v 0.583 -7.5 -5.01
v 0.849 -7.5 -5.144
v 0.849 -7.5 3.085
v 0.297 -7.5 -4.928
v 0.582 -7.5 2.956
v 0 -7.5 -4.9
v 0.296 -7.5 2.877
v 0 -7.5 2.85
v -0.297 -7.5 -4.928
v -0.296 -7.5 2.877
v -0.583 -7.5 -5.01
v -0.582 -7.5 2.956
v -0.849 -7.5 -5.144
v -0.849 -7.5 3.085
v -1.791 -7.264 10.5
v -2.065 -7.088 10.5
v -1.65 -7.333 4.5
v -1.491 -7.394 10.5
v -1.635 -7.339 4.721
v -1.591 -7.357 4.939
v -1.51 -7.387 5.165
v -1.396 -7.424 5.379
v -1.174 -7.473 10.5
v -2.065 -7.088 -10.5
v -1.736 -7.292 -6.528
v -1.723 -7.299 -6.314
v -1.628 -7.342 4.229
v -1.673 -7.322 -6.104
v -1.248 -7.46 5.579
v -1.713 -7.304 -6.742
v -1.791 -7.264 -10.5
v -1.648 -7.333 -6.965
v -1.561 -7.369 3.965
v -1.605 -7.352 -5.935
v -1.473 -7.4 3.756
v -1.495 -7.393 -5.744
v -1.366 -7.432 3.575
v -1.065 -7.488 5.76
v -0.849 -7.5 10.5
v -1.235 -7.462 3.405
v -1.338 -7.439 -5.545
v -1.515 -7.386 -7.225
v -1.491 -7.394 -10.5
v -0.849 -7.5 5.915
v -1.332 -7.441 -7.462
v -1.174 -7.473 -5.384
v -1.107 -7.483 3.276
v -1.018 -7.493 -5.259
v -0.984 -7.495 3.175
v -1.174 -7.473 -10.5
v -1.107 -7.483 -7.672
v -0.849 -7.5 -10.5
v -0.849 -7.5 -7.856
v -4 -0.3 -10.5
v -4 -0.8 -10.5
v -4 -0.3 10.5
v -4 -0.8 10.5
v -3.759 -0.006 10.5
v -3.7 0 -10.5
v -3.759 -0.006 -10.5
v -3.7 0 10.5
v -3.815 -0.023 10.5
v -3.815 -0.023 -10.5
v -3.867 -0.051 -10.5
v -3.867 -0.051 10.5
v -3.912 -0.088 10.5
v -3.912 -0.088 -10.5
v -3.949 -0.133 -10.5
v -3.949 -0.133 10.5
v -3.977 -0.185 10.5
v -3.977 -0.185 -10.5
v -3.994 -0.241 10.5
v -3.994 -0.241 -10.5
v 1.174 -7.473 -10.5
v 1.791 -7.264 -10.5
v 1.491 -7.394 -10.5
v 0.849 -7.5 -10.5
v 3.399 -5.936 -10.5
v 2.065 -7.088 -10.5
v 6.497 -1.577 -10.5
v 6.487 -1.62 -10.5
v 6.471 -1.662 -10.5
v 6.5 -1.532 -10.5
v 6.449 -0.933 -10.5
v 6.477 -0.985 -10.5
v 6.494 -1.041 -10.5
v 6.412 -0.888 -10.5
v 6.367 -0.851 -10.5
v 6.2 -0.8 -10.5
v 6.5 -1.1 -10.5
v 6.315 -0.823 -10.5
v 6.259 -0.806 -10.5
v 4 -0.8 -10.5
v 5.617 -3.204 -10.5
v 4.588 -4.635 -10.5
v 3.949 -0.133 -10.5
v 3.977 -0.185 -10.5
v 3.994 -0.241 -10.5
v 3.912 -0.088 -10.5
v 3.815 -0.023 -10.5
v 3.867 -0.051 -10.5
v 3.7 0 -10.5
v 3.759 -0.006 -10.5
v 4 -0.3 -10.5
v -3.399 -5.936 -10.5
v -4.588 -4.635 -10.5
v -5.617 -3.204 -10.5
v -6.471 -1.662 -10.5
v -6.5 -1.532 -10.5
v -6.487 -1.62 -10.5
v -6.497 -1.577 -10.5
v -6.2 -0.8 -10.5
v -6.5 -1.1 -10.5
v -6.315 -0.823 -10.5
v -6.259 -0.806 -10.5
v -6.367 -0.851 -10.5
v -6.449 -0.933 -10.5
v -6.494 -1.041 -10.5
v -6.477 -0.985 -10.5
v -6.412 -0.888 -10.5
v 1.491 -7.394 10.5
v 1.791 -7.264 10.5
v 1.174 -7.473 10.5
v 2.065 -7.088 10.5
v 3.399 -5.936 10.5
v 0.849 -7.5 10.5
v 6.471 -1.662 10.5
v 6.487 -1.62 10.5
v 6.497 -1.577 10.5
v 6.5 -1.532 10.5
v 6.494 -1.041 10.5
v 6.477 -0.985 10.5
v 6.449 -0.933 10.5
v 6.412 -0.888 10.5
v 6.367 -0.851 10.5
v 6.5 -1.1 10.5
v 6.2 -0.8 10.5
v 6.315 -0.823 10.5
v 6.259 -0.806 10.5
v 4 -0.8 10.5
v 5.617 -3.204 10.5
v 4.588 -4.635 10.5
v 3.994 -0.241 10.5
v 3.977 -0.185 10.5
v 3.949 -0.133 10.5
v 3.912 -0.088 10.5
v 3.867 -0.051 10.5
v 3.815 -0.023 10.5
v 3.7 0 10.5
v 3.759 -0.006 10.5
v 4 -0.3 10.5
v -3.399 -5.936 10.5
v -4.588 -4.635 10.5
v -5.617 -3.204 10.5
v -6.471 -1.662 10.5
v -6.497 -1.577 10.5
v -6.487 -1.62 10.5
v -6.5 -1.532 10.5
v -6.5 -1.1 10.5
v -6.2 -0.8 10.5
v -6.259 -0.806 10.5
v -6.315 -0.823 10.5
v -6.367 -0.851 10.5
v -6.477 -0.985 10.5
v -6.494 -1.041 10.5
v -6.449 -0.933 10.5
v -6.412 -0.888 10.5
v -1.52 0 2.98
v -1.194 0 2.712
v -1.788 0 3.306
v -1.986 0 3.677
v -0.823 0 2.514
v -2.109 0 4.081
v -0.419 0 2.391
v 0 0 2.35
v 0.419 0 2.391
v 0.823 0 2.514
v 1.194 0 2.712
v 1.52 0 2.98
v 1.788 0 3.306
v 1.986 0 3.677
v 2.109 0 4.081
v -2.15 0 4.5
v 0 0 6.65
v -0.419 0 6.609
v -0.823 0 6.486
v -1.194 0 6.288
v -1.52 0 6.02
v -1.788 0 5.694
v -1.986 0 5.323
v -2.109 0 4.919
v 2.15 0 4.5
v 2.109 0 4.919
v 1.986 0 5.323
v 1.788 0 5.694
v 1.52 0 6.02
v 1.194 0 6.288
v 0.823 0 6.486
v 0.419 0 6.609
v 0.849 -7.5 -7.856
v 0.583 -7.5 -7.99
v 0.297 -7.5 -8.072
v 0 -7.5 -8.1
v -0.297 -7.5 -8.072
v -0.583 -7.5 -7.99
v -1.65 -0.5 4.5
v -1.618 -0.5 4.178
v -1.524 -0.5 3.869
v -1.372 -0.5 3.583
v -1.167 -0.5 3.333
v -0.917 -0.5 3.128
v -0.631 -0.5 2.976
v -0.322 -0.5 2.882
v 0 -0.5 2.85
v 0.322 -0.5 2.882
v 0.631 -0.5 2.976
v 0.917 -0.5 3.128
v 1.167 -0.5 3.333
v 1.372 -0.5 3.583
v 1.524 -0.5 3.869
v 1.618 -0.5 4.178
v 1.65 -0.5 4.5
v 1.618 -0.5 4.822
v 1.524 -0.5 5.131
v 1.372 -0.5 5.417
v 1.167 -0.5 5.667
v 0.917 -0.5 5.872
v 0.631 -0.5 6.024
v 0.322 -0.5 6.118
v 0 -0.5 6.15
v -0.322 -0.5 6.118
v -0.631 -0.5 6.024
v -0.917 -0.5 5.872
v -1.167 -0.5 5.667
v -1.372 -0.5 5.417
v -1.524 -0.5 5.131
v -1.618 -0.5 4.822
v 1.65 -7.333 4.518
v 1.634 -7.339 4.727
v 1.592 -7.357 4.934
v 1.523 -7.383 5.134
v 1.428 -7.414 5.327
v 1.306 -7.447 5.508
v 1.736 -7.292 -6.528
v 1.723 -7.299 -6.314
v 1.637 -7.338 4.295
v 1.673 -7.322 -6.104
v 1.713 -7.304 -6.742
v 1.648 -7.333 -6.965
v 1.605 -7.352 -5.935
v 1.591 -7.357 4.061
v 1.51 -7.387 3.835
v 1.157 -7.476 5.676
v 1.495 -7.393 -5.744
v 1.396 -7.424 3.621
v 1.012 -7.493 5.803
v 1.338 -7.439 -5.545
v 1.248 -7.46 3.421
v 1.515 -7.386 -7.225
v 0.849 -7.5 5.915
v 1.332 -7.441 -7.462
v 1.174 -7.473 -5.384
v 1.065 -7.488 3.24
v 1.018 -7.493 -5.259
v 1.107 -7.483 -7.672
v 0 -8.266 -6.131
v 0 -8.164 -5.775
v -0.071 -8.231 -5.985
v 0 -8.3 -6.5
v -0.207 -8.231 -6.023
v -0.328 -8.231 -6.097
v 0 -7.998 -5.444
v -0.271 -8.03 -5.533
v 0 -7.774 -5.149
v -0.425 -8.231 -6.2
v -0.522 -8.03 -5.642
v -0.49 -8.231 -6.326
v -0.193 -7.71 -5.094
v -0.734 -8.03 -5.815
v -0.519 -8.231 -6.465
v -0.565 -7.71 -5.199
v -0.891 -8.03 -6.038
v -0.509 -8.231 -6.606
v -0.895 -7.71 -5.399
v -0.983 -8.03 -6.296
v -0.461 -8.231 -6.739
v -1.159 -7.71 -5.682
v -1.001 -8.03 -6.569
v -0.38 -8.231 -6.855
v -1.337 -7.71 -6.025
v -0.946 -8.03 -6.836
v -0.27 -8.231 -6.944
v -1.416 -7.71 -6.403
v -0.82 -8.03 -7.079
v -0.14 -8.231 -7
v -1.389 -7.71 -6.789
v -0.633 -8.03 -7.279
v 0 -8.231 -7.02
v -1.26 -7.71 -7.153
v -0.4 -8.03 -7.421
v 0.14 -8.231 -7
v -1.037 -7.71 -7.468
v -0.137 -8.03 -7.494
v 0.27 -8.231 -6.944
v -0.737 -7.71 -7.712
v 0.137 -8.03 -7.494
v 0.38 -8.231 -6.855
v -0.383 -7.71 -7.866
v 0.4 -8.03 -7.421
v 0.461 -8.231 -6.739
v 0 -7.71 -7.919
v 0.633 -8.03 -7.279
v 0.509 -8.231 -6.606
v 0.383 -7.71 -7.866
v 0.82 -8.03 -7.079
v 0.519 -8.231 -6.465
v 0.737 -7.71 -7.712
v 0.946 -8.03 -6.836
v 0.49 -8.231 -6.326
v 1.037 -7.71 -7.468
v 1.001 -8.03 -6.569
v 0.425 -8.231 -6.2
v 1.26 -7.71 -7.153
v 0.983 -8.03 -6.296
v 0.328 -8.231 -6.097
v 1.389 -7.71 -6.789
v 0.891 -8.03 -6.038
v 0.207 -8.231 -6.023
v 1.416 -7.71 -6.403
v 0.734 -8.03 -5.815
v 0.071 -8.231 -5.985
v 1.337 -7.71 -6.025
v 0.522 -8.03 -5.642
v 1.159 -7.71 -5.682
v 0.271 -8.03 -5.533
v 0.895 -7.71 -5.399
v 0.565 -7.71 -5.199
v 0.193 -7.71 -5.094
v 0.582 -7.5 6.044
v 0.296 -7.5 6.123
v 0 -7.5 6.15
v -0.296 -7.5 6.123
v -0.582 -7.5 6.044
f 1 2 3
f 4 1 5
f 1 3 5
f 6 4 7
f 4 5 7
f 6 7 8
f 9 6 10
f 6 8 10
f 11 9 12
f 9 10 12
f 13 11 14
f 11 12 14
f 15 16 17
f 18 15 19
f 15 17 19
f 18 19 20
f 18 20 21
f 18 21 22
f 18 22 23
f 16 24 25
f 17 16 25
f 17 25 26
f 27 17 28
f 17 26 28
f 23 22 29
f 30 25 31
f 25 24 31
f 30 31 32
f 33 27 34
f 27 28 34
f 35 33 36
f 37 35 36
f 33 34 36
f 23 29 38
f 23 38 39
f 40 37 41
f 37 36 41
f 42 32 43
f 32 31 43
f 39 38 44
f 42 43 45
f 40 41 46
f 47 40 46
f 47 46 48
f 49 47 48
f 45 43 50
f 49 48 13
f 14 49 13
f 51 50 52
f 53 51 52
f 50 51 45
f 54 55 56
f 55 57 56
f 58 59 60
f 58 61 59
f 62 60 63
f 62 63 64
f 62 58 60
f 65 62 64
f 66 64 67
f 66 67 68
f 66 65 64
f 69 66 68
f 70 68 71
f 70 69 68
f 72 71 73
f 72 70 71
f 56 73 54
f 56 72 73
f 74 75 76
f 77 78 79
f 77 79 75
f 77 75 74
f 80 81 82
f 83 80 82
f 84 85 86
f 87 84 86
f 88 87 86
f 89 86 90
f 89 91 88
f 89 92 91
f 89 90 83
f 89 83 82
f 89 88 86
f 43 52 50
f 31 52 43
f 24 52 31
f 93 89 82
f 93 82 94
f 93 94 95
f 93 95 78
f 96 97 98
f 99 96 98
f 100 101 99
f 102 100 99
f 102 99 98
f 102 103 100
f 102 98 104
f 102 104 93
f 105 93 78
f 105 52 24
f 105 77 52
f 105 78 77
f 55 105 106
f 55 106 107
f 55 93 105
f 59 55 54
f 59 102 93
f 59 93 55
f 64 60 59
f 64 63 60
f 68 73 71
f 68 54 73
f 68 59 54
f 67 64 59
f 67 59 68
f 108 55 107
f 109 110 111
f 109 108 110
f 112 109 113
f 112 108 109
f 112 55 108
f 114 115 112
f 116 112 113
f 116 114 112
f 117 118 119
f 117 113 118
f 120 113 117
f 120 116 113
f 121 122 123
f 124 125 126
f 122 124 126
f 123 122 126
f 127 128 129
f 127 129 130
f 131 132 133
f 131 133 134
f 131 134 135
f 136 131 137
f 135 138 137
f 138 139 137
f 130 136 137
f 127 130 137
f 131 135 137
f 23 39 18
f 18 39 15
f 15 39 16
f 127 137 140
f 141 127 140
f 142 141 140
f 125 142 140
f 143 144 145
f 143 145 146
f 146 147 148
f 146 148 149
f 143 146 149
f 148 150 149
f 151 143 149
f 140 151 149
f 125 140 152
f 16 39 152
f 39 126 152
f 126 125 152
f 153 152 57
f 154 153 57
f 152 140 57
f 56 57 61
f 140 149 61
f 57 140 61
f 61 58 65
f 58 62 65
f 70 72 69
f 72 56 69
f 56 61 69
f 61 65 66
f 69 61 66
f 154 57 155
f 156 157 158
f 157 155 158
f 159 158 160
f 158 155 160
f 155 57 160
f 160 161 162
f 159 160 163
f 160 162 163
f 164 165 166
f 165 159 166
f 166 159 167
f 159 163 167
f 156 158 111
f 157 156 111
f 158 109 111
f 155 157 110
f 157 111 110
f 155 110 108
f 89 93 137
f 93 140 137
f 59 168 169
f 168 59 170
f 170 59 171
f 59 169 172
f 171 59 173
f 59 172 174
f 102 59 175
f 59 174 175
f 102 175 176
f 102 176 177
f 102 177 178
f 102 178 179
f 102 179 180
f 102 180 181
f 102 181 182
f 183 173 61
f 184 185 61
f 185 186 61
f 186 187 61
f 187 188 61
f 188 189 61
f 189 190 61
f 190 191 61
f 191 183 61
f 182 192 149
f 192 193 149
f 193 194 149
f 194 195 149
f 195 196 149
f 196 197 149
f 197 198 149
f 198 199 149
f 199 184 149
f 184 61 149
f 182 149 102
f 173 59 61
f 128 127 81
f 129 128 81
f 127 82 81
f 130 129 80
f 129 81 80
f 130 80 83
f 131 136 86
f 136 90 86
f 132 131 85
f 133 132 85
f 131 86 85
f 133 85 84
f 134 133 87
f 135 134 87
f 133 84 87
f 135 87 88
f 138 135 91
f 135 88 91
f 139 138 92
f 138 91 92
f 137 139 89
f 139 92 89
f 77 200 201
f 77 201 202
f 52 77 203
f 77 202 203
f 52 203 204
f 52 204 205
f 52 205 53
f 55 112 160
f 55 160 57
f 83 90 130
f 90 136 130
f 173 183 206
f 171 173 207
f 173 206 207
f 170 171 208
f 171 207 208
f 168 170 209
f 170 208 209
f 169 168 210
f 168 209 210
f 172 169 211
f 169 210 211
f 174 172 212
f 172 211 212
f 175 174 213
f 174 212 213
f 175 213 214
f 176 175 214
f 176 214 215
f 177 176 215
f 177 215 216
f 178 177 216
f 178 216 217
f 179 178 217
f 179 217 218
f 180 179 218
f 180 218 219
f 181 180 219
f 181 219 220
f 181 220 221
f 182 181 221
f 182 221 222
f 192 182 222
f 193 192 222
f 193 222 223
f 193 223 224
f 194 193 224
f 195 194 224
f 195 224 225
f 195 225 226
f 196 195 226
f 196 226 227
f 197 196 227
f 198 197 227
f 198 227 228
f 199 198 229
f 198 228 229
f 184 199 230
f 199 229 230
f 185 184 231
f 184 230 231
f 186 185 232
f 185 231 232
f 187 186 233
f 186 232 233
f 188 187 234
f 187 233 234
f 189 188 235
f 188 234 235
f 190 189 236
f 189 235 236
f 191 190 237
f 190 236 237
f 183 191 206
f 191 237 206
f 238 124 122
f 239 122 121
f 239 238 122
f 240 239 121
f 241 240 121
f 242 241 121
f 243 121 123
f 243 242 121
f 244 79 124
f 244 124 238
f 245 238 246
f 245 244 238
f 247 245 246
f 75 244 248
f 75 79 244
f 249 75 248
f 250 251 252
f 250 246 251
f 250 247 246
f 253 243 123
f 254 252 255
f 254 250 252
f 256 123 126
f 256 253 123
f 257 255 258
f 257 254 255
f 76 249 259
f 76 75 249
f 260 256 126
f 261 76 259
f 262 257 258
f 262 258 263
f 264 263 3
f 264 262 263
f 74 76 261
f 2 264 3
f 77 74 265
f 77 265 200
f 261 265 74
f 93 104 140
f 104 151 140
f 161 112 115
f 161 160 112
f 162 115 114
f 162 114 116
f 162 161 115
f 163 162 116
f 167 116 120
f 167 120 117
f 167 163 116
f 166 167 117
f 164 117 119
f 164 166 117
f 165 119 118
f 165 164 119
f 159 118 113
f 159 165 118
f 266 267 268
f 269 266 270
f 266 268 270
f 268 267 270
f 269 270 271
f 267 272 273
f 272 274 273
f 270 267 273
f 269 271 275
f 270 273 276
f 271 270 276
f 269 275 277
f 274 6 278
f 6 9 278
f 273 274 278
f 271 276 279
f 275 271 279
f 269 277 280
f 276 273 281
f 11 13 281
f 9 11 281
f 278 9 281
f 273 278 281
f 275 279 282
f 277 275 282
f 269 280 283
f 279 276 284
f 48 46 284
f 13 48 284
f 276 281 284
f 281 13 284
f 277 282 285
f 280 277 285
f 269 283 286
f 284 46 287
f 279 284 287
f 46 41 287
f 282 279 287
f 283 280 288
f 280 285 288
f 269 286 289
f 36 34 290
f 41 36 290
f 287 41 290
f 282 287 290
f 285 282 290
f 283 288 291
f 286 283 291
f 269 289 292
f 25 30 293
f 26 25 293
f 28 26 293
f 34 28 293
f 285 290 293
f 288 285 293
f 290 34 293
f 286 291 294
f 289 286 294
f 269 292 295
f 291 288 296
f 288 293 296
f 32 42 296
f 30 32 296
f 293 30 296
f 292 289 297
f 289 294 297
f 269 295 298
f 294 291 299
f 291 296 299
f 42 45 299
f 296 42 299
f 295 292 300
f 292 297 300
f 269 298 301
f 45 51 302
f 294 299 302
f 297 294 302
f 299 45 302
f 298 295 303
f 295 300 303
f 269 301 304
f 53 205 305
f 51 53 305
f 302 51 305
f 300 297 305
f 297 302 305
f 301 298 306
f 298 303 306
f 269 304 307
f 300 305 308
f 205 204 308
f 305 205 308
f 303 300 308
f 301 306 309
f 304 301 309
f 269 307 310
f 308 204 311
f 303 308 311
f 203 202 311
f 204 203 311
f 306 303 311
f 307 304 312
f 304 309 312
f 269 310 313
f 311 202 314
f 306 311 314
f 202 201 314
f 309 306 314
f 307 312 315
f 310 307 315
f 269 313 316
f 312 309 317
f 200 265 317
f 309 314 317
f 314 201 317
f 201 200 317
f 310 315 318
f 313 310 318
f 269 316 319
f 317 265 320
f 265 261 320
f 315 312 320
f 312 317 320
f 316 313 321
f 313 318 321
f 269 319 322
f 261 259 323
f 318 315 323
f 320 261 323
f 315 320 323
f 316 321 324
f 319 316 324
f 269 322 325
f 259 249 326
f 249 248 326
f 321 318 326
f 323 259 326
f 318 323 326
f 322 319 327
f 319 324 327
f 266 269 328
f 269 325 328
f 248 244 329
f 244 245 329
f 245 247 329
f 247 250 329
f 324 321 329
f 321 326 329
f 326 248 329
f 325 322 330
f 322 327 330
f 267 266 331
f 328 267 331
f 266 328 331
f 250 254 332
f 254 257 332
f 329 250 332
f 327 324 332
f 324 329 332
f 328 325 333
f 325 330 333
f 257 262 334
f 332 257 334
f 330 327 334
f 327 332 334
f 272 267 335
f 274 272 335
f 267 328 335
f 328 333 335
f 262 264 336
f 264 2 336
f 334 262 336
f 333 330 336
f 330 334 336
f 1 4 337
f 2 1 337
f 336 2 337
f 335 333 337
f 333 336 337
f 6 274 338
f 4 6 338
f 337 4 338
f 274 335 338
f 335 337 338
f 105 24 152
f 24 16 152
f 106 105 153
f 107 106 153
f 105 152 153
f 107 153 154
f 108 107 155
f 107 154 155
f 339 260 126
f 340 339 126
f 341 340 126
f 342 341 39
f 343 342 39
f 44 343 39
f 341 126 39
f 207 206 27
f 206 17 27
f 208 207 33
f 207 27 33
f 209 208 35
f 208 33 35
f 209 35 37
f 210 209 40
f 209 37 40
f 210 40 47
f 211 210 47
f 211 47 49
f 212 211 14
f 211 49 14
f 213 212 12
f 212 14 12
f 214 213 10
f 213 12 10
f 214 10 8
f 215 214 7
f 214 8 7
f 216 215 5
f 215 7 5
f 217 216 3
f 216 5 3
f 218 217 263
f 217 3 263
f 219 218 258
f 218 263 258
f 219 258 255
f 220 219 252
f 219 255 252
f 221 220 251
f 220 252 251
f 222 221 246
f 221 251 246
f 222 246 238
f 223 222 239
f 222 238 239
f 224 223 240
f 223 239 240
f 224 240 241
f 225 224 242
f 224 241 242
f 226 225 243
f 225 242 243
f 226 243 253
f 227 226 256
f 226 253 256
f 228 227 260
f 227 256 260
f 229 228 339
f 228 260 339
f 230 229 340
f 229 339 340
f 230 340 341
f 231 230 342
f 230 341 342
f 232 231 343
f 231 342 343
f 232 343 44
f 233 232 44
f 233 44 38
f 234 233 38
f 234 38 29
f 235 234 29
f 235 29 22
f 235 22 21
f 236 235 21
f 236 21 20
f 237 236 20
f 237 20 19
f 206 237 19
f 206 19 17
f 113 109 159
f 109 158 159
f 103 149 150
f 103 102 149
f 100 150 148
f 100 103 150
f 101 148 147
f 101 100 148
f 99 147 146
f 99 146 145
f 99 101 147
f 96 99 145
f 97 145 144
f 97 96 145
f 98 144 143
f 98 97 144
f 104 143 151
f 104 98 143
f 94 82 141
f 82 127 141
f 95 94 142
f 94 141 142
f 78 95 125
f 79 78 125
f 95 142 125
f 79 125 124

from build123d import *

# Parameters (mm, degrees)
EXTRUDE_1_DEPTH             = 10.5
FILLET_1_R                  = 0.3
FILLET_2_R                  = 2
HOLE_WIZARD_M41_D           = 3.3
HOLE_WIZARD_M41_CSINK_D     = 4.3
HOLE_WIZARD_M41_CSINK_ANGLE = 90


with BuildPart() as part:
    # Эскиз1 → Бобышка-Вытянуть1 (new body, symmetric)
    with BuildSketch(Plane.XY):
        with BuildLine():
            Line((-4, 0), (4, 0))
            Line((4, 0), (4, -0.8))
            Line((4, -0.8), (6.5, -0.8))
            Line((6.5, -0.8), (6.5, -1.6))
            ThreePointArc((6.5, -1.6), (4.386776199, -4.87777644), (1.5, -7.5))
            Line((1.5, -7.5), (-1.5, -7.5))
            ThreePointArc((-1.5, -7.5), (-4.386776199, -4.87777644), (-6.5, -1.6))
            Line((-6.5, -1.6), (-6.5, -0.8))
            Line((-6.5, -0.8), (-4, -0.8))
            Line((-4, -0.8), (-4, 0))
        make_face()
    extrude(amount=EXTRUDE_1_DEPTH, both=True)

    # Скругление1
    fillet_1_edges = [part.edges().sort_by_distance(p)[0] for p in [
        (6.5, -0.8, 0),
        (6.5, -1.6, 0),
        (-6.5, -1.6, 0),
        (-6.5, -0.8, 0),
        (-4, 0, 0),
        (4, 0, 0),
    ]]
    fillet(fillet_1_edges, radius=FILLET_1_R)

    # Скругление2
    fillet_2_edges = [part.edges().sort_by_distance(p)[0] for p in [
        (1.5, -7.5, 0),
        (-1.5, -7.5, 0),
    ]]
    fillet(fillet_2_edges, radius=FILLET_2_R)

    # Отверстие обработанное метчиком M41 (through all)
    with Locations(Plane(origin=(0, 0, 0), x_dir=(1, 0, 0), z_dir=(0, 1, 0))):
        with Locations((0, -4.5)):
            CounterSinkHole(HOLE_WIZARD_M41_D / 2, HOLE_WIZARD_M41_CSINK_D / 2, counter_sink_angle=HOLE_WIZARD_M41_CSINK_ANGLE)

    # Эскиз5 → Повернуть1 (revolve)
    with BuildSketch(Plane(origin=(0, 0, 0), x_dir=(0, 0, -1), z_dir=(1, 0, 0))):
        with BuildLine():
            Line((6.5, -4.3), (6.5, -8.3))
            ThreePointArc((6.5, -8.3), (4.5, -6.3), (6.5, -4.3))
        make_face()
    revolve(axis=Axis((0, -4.3, -6.5), (0, -1, 0)))


solid = part.part
